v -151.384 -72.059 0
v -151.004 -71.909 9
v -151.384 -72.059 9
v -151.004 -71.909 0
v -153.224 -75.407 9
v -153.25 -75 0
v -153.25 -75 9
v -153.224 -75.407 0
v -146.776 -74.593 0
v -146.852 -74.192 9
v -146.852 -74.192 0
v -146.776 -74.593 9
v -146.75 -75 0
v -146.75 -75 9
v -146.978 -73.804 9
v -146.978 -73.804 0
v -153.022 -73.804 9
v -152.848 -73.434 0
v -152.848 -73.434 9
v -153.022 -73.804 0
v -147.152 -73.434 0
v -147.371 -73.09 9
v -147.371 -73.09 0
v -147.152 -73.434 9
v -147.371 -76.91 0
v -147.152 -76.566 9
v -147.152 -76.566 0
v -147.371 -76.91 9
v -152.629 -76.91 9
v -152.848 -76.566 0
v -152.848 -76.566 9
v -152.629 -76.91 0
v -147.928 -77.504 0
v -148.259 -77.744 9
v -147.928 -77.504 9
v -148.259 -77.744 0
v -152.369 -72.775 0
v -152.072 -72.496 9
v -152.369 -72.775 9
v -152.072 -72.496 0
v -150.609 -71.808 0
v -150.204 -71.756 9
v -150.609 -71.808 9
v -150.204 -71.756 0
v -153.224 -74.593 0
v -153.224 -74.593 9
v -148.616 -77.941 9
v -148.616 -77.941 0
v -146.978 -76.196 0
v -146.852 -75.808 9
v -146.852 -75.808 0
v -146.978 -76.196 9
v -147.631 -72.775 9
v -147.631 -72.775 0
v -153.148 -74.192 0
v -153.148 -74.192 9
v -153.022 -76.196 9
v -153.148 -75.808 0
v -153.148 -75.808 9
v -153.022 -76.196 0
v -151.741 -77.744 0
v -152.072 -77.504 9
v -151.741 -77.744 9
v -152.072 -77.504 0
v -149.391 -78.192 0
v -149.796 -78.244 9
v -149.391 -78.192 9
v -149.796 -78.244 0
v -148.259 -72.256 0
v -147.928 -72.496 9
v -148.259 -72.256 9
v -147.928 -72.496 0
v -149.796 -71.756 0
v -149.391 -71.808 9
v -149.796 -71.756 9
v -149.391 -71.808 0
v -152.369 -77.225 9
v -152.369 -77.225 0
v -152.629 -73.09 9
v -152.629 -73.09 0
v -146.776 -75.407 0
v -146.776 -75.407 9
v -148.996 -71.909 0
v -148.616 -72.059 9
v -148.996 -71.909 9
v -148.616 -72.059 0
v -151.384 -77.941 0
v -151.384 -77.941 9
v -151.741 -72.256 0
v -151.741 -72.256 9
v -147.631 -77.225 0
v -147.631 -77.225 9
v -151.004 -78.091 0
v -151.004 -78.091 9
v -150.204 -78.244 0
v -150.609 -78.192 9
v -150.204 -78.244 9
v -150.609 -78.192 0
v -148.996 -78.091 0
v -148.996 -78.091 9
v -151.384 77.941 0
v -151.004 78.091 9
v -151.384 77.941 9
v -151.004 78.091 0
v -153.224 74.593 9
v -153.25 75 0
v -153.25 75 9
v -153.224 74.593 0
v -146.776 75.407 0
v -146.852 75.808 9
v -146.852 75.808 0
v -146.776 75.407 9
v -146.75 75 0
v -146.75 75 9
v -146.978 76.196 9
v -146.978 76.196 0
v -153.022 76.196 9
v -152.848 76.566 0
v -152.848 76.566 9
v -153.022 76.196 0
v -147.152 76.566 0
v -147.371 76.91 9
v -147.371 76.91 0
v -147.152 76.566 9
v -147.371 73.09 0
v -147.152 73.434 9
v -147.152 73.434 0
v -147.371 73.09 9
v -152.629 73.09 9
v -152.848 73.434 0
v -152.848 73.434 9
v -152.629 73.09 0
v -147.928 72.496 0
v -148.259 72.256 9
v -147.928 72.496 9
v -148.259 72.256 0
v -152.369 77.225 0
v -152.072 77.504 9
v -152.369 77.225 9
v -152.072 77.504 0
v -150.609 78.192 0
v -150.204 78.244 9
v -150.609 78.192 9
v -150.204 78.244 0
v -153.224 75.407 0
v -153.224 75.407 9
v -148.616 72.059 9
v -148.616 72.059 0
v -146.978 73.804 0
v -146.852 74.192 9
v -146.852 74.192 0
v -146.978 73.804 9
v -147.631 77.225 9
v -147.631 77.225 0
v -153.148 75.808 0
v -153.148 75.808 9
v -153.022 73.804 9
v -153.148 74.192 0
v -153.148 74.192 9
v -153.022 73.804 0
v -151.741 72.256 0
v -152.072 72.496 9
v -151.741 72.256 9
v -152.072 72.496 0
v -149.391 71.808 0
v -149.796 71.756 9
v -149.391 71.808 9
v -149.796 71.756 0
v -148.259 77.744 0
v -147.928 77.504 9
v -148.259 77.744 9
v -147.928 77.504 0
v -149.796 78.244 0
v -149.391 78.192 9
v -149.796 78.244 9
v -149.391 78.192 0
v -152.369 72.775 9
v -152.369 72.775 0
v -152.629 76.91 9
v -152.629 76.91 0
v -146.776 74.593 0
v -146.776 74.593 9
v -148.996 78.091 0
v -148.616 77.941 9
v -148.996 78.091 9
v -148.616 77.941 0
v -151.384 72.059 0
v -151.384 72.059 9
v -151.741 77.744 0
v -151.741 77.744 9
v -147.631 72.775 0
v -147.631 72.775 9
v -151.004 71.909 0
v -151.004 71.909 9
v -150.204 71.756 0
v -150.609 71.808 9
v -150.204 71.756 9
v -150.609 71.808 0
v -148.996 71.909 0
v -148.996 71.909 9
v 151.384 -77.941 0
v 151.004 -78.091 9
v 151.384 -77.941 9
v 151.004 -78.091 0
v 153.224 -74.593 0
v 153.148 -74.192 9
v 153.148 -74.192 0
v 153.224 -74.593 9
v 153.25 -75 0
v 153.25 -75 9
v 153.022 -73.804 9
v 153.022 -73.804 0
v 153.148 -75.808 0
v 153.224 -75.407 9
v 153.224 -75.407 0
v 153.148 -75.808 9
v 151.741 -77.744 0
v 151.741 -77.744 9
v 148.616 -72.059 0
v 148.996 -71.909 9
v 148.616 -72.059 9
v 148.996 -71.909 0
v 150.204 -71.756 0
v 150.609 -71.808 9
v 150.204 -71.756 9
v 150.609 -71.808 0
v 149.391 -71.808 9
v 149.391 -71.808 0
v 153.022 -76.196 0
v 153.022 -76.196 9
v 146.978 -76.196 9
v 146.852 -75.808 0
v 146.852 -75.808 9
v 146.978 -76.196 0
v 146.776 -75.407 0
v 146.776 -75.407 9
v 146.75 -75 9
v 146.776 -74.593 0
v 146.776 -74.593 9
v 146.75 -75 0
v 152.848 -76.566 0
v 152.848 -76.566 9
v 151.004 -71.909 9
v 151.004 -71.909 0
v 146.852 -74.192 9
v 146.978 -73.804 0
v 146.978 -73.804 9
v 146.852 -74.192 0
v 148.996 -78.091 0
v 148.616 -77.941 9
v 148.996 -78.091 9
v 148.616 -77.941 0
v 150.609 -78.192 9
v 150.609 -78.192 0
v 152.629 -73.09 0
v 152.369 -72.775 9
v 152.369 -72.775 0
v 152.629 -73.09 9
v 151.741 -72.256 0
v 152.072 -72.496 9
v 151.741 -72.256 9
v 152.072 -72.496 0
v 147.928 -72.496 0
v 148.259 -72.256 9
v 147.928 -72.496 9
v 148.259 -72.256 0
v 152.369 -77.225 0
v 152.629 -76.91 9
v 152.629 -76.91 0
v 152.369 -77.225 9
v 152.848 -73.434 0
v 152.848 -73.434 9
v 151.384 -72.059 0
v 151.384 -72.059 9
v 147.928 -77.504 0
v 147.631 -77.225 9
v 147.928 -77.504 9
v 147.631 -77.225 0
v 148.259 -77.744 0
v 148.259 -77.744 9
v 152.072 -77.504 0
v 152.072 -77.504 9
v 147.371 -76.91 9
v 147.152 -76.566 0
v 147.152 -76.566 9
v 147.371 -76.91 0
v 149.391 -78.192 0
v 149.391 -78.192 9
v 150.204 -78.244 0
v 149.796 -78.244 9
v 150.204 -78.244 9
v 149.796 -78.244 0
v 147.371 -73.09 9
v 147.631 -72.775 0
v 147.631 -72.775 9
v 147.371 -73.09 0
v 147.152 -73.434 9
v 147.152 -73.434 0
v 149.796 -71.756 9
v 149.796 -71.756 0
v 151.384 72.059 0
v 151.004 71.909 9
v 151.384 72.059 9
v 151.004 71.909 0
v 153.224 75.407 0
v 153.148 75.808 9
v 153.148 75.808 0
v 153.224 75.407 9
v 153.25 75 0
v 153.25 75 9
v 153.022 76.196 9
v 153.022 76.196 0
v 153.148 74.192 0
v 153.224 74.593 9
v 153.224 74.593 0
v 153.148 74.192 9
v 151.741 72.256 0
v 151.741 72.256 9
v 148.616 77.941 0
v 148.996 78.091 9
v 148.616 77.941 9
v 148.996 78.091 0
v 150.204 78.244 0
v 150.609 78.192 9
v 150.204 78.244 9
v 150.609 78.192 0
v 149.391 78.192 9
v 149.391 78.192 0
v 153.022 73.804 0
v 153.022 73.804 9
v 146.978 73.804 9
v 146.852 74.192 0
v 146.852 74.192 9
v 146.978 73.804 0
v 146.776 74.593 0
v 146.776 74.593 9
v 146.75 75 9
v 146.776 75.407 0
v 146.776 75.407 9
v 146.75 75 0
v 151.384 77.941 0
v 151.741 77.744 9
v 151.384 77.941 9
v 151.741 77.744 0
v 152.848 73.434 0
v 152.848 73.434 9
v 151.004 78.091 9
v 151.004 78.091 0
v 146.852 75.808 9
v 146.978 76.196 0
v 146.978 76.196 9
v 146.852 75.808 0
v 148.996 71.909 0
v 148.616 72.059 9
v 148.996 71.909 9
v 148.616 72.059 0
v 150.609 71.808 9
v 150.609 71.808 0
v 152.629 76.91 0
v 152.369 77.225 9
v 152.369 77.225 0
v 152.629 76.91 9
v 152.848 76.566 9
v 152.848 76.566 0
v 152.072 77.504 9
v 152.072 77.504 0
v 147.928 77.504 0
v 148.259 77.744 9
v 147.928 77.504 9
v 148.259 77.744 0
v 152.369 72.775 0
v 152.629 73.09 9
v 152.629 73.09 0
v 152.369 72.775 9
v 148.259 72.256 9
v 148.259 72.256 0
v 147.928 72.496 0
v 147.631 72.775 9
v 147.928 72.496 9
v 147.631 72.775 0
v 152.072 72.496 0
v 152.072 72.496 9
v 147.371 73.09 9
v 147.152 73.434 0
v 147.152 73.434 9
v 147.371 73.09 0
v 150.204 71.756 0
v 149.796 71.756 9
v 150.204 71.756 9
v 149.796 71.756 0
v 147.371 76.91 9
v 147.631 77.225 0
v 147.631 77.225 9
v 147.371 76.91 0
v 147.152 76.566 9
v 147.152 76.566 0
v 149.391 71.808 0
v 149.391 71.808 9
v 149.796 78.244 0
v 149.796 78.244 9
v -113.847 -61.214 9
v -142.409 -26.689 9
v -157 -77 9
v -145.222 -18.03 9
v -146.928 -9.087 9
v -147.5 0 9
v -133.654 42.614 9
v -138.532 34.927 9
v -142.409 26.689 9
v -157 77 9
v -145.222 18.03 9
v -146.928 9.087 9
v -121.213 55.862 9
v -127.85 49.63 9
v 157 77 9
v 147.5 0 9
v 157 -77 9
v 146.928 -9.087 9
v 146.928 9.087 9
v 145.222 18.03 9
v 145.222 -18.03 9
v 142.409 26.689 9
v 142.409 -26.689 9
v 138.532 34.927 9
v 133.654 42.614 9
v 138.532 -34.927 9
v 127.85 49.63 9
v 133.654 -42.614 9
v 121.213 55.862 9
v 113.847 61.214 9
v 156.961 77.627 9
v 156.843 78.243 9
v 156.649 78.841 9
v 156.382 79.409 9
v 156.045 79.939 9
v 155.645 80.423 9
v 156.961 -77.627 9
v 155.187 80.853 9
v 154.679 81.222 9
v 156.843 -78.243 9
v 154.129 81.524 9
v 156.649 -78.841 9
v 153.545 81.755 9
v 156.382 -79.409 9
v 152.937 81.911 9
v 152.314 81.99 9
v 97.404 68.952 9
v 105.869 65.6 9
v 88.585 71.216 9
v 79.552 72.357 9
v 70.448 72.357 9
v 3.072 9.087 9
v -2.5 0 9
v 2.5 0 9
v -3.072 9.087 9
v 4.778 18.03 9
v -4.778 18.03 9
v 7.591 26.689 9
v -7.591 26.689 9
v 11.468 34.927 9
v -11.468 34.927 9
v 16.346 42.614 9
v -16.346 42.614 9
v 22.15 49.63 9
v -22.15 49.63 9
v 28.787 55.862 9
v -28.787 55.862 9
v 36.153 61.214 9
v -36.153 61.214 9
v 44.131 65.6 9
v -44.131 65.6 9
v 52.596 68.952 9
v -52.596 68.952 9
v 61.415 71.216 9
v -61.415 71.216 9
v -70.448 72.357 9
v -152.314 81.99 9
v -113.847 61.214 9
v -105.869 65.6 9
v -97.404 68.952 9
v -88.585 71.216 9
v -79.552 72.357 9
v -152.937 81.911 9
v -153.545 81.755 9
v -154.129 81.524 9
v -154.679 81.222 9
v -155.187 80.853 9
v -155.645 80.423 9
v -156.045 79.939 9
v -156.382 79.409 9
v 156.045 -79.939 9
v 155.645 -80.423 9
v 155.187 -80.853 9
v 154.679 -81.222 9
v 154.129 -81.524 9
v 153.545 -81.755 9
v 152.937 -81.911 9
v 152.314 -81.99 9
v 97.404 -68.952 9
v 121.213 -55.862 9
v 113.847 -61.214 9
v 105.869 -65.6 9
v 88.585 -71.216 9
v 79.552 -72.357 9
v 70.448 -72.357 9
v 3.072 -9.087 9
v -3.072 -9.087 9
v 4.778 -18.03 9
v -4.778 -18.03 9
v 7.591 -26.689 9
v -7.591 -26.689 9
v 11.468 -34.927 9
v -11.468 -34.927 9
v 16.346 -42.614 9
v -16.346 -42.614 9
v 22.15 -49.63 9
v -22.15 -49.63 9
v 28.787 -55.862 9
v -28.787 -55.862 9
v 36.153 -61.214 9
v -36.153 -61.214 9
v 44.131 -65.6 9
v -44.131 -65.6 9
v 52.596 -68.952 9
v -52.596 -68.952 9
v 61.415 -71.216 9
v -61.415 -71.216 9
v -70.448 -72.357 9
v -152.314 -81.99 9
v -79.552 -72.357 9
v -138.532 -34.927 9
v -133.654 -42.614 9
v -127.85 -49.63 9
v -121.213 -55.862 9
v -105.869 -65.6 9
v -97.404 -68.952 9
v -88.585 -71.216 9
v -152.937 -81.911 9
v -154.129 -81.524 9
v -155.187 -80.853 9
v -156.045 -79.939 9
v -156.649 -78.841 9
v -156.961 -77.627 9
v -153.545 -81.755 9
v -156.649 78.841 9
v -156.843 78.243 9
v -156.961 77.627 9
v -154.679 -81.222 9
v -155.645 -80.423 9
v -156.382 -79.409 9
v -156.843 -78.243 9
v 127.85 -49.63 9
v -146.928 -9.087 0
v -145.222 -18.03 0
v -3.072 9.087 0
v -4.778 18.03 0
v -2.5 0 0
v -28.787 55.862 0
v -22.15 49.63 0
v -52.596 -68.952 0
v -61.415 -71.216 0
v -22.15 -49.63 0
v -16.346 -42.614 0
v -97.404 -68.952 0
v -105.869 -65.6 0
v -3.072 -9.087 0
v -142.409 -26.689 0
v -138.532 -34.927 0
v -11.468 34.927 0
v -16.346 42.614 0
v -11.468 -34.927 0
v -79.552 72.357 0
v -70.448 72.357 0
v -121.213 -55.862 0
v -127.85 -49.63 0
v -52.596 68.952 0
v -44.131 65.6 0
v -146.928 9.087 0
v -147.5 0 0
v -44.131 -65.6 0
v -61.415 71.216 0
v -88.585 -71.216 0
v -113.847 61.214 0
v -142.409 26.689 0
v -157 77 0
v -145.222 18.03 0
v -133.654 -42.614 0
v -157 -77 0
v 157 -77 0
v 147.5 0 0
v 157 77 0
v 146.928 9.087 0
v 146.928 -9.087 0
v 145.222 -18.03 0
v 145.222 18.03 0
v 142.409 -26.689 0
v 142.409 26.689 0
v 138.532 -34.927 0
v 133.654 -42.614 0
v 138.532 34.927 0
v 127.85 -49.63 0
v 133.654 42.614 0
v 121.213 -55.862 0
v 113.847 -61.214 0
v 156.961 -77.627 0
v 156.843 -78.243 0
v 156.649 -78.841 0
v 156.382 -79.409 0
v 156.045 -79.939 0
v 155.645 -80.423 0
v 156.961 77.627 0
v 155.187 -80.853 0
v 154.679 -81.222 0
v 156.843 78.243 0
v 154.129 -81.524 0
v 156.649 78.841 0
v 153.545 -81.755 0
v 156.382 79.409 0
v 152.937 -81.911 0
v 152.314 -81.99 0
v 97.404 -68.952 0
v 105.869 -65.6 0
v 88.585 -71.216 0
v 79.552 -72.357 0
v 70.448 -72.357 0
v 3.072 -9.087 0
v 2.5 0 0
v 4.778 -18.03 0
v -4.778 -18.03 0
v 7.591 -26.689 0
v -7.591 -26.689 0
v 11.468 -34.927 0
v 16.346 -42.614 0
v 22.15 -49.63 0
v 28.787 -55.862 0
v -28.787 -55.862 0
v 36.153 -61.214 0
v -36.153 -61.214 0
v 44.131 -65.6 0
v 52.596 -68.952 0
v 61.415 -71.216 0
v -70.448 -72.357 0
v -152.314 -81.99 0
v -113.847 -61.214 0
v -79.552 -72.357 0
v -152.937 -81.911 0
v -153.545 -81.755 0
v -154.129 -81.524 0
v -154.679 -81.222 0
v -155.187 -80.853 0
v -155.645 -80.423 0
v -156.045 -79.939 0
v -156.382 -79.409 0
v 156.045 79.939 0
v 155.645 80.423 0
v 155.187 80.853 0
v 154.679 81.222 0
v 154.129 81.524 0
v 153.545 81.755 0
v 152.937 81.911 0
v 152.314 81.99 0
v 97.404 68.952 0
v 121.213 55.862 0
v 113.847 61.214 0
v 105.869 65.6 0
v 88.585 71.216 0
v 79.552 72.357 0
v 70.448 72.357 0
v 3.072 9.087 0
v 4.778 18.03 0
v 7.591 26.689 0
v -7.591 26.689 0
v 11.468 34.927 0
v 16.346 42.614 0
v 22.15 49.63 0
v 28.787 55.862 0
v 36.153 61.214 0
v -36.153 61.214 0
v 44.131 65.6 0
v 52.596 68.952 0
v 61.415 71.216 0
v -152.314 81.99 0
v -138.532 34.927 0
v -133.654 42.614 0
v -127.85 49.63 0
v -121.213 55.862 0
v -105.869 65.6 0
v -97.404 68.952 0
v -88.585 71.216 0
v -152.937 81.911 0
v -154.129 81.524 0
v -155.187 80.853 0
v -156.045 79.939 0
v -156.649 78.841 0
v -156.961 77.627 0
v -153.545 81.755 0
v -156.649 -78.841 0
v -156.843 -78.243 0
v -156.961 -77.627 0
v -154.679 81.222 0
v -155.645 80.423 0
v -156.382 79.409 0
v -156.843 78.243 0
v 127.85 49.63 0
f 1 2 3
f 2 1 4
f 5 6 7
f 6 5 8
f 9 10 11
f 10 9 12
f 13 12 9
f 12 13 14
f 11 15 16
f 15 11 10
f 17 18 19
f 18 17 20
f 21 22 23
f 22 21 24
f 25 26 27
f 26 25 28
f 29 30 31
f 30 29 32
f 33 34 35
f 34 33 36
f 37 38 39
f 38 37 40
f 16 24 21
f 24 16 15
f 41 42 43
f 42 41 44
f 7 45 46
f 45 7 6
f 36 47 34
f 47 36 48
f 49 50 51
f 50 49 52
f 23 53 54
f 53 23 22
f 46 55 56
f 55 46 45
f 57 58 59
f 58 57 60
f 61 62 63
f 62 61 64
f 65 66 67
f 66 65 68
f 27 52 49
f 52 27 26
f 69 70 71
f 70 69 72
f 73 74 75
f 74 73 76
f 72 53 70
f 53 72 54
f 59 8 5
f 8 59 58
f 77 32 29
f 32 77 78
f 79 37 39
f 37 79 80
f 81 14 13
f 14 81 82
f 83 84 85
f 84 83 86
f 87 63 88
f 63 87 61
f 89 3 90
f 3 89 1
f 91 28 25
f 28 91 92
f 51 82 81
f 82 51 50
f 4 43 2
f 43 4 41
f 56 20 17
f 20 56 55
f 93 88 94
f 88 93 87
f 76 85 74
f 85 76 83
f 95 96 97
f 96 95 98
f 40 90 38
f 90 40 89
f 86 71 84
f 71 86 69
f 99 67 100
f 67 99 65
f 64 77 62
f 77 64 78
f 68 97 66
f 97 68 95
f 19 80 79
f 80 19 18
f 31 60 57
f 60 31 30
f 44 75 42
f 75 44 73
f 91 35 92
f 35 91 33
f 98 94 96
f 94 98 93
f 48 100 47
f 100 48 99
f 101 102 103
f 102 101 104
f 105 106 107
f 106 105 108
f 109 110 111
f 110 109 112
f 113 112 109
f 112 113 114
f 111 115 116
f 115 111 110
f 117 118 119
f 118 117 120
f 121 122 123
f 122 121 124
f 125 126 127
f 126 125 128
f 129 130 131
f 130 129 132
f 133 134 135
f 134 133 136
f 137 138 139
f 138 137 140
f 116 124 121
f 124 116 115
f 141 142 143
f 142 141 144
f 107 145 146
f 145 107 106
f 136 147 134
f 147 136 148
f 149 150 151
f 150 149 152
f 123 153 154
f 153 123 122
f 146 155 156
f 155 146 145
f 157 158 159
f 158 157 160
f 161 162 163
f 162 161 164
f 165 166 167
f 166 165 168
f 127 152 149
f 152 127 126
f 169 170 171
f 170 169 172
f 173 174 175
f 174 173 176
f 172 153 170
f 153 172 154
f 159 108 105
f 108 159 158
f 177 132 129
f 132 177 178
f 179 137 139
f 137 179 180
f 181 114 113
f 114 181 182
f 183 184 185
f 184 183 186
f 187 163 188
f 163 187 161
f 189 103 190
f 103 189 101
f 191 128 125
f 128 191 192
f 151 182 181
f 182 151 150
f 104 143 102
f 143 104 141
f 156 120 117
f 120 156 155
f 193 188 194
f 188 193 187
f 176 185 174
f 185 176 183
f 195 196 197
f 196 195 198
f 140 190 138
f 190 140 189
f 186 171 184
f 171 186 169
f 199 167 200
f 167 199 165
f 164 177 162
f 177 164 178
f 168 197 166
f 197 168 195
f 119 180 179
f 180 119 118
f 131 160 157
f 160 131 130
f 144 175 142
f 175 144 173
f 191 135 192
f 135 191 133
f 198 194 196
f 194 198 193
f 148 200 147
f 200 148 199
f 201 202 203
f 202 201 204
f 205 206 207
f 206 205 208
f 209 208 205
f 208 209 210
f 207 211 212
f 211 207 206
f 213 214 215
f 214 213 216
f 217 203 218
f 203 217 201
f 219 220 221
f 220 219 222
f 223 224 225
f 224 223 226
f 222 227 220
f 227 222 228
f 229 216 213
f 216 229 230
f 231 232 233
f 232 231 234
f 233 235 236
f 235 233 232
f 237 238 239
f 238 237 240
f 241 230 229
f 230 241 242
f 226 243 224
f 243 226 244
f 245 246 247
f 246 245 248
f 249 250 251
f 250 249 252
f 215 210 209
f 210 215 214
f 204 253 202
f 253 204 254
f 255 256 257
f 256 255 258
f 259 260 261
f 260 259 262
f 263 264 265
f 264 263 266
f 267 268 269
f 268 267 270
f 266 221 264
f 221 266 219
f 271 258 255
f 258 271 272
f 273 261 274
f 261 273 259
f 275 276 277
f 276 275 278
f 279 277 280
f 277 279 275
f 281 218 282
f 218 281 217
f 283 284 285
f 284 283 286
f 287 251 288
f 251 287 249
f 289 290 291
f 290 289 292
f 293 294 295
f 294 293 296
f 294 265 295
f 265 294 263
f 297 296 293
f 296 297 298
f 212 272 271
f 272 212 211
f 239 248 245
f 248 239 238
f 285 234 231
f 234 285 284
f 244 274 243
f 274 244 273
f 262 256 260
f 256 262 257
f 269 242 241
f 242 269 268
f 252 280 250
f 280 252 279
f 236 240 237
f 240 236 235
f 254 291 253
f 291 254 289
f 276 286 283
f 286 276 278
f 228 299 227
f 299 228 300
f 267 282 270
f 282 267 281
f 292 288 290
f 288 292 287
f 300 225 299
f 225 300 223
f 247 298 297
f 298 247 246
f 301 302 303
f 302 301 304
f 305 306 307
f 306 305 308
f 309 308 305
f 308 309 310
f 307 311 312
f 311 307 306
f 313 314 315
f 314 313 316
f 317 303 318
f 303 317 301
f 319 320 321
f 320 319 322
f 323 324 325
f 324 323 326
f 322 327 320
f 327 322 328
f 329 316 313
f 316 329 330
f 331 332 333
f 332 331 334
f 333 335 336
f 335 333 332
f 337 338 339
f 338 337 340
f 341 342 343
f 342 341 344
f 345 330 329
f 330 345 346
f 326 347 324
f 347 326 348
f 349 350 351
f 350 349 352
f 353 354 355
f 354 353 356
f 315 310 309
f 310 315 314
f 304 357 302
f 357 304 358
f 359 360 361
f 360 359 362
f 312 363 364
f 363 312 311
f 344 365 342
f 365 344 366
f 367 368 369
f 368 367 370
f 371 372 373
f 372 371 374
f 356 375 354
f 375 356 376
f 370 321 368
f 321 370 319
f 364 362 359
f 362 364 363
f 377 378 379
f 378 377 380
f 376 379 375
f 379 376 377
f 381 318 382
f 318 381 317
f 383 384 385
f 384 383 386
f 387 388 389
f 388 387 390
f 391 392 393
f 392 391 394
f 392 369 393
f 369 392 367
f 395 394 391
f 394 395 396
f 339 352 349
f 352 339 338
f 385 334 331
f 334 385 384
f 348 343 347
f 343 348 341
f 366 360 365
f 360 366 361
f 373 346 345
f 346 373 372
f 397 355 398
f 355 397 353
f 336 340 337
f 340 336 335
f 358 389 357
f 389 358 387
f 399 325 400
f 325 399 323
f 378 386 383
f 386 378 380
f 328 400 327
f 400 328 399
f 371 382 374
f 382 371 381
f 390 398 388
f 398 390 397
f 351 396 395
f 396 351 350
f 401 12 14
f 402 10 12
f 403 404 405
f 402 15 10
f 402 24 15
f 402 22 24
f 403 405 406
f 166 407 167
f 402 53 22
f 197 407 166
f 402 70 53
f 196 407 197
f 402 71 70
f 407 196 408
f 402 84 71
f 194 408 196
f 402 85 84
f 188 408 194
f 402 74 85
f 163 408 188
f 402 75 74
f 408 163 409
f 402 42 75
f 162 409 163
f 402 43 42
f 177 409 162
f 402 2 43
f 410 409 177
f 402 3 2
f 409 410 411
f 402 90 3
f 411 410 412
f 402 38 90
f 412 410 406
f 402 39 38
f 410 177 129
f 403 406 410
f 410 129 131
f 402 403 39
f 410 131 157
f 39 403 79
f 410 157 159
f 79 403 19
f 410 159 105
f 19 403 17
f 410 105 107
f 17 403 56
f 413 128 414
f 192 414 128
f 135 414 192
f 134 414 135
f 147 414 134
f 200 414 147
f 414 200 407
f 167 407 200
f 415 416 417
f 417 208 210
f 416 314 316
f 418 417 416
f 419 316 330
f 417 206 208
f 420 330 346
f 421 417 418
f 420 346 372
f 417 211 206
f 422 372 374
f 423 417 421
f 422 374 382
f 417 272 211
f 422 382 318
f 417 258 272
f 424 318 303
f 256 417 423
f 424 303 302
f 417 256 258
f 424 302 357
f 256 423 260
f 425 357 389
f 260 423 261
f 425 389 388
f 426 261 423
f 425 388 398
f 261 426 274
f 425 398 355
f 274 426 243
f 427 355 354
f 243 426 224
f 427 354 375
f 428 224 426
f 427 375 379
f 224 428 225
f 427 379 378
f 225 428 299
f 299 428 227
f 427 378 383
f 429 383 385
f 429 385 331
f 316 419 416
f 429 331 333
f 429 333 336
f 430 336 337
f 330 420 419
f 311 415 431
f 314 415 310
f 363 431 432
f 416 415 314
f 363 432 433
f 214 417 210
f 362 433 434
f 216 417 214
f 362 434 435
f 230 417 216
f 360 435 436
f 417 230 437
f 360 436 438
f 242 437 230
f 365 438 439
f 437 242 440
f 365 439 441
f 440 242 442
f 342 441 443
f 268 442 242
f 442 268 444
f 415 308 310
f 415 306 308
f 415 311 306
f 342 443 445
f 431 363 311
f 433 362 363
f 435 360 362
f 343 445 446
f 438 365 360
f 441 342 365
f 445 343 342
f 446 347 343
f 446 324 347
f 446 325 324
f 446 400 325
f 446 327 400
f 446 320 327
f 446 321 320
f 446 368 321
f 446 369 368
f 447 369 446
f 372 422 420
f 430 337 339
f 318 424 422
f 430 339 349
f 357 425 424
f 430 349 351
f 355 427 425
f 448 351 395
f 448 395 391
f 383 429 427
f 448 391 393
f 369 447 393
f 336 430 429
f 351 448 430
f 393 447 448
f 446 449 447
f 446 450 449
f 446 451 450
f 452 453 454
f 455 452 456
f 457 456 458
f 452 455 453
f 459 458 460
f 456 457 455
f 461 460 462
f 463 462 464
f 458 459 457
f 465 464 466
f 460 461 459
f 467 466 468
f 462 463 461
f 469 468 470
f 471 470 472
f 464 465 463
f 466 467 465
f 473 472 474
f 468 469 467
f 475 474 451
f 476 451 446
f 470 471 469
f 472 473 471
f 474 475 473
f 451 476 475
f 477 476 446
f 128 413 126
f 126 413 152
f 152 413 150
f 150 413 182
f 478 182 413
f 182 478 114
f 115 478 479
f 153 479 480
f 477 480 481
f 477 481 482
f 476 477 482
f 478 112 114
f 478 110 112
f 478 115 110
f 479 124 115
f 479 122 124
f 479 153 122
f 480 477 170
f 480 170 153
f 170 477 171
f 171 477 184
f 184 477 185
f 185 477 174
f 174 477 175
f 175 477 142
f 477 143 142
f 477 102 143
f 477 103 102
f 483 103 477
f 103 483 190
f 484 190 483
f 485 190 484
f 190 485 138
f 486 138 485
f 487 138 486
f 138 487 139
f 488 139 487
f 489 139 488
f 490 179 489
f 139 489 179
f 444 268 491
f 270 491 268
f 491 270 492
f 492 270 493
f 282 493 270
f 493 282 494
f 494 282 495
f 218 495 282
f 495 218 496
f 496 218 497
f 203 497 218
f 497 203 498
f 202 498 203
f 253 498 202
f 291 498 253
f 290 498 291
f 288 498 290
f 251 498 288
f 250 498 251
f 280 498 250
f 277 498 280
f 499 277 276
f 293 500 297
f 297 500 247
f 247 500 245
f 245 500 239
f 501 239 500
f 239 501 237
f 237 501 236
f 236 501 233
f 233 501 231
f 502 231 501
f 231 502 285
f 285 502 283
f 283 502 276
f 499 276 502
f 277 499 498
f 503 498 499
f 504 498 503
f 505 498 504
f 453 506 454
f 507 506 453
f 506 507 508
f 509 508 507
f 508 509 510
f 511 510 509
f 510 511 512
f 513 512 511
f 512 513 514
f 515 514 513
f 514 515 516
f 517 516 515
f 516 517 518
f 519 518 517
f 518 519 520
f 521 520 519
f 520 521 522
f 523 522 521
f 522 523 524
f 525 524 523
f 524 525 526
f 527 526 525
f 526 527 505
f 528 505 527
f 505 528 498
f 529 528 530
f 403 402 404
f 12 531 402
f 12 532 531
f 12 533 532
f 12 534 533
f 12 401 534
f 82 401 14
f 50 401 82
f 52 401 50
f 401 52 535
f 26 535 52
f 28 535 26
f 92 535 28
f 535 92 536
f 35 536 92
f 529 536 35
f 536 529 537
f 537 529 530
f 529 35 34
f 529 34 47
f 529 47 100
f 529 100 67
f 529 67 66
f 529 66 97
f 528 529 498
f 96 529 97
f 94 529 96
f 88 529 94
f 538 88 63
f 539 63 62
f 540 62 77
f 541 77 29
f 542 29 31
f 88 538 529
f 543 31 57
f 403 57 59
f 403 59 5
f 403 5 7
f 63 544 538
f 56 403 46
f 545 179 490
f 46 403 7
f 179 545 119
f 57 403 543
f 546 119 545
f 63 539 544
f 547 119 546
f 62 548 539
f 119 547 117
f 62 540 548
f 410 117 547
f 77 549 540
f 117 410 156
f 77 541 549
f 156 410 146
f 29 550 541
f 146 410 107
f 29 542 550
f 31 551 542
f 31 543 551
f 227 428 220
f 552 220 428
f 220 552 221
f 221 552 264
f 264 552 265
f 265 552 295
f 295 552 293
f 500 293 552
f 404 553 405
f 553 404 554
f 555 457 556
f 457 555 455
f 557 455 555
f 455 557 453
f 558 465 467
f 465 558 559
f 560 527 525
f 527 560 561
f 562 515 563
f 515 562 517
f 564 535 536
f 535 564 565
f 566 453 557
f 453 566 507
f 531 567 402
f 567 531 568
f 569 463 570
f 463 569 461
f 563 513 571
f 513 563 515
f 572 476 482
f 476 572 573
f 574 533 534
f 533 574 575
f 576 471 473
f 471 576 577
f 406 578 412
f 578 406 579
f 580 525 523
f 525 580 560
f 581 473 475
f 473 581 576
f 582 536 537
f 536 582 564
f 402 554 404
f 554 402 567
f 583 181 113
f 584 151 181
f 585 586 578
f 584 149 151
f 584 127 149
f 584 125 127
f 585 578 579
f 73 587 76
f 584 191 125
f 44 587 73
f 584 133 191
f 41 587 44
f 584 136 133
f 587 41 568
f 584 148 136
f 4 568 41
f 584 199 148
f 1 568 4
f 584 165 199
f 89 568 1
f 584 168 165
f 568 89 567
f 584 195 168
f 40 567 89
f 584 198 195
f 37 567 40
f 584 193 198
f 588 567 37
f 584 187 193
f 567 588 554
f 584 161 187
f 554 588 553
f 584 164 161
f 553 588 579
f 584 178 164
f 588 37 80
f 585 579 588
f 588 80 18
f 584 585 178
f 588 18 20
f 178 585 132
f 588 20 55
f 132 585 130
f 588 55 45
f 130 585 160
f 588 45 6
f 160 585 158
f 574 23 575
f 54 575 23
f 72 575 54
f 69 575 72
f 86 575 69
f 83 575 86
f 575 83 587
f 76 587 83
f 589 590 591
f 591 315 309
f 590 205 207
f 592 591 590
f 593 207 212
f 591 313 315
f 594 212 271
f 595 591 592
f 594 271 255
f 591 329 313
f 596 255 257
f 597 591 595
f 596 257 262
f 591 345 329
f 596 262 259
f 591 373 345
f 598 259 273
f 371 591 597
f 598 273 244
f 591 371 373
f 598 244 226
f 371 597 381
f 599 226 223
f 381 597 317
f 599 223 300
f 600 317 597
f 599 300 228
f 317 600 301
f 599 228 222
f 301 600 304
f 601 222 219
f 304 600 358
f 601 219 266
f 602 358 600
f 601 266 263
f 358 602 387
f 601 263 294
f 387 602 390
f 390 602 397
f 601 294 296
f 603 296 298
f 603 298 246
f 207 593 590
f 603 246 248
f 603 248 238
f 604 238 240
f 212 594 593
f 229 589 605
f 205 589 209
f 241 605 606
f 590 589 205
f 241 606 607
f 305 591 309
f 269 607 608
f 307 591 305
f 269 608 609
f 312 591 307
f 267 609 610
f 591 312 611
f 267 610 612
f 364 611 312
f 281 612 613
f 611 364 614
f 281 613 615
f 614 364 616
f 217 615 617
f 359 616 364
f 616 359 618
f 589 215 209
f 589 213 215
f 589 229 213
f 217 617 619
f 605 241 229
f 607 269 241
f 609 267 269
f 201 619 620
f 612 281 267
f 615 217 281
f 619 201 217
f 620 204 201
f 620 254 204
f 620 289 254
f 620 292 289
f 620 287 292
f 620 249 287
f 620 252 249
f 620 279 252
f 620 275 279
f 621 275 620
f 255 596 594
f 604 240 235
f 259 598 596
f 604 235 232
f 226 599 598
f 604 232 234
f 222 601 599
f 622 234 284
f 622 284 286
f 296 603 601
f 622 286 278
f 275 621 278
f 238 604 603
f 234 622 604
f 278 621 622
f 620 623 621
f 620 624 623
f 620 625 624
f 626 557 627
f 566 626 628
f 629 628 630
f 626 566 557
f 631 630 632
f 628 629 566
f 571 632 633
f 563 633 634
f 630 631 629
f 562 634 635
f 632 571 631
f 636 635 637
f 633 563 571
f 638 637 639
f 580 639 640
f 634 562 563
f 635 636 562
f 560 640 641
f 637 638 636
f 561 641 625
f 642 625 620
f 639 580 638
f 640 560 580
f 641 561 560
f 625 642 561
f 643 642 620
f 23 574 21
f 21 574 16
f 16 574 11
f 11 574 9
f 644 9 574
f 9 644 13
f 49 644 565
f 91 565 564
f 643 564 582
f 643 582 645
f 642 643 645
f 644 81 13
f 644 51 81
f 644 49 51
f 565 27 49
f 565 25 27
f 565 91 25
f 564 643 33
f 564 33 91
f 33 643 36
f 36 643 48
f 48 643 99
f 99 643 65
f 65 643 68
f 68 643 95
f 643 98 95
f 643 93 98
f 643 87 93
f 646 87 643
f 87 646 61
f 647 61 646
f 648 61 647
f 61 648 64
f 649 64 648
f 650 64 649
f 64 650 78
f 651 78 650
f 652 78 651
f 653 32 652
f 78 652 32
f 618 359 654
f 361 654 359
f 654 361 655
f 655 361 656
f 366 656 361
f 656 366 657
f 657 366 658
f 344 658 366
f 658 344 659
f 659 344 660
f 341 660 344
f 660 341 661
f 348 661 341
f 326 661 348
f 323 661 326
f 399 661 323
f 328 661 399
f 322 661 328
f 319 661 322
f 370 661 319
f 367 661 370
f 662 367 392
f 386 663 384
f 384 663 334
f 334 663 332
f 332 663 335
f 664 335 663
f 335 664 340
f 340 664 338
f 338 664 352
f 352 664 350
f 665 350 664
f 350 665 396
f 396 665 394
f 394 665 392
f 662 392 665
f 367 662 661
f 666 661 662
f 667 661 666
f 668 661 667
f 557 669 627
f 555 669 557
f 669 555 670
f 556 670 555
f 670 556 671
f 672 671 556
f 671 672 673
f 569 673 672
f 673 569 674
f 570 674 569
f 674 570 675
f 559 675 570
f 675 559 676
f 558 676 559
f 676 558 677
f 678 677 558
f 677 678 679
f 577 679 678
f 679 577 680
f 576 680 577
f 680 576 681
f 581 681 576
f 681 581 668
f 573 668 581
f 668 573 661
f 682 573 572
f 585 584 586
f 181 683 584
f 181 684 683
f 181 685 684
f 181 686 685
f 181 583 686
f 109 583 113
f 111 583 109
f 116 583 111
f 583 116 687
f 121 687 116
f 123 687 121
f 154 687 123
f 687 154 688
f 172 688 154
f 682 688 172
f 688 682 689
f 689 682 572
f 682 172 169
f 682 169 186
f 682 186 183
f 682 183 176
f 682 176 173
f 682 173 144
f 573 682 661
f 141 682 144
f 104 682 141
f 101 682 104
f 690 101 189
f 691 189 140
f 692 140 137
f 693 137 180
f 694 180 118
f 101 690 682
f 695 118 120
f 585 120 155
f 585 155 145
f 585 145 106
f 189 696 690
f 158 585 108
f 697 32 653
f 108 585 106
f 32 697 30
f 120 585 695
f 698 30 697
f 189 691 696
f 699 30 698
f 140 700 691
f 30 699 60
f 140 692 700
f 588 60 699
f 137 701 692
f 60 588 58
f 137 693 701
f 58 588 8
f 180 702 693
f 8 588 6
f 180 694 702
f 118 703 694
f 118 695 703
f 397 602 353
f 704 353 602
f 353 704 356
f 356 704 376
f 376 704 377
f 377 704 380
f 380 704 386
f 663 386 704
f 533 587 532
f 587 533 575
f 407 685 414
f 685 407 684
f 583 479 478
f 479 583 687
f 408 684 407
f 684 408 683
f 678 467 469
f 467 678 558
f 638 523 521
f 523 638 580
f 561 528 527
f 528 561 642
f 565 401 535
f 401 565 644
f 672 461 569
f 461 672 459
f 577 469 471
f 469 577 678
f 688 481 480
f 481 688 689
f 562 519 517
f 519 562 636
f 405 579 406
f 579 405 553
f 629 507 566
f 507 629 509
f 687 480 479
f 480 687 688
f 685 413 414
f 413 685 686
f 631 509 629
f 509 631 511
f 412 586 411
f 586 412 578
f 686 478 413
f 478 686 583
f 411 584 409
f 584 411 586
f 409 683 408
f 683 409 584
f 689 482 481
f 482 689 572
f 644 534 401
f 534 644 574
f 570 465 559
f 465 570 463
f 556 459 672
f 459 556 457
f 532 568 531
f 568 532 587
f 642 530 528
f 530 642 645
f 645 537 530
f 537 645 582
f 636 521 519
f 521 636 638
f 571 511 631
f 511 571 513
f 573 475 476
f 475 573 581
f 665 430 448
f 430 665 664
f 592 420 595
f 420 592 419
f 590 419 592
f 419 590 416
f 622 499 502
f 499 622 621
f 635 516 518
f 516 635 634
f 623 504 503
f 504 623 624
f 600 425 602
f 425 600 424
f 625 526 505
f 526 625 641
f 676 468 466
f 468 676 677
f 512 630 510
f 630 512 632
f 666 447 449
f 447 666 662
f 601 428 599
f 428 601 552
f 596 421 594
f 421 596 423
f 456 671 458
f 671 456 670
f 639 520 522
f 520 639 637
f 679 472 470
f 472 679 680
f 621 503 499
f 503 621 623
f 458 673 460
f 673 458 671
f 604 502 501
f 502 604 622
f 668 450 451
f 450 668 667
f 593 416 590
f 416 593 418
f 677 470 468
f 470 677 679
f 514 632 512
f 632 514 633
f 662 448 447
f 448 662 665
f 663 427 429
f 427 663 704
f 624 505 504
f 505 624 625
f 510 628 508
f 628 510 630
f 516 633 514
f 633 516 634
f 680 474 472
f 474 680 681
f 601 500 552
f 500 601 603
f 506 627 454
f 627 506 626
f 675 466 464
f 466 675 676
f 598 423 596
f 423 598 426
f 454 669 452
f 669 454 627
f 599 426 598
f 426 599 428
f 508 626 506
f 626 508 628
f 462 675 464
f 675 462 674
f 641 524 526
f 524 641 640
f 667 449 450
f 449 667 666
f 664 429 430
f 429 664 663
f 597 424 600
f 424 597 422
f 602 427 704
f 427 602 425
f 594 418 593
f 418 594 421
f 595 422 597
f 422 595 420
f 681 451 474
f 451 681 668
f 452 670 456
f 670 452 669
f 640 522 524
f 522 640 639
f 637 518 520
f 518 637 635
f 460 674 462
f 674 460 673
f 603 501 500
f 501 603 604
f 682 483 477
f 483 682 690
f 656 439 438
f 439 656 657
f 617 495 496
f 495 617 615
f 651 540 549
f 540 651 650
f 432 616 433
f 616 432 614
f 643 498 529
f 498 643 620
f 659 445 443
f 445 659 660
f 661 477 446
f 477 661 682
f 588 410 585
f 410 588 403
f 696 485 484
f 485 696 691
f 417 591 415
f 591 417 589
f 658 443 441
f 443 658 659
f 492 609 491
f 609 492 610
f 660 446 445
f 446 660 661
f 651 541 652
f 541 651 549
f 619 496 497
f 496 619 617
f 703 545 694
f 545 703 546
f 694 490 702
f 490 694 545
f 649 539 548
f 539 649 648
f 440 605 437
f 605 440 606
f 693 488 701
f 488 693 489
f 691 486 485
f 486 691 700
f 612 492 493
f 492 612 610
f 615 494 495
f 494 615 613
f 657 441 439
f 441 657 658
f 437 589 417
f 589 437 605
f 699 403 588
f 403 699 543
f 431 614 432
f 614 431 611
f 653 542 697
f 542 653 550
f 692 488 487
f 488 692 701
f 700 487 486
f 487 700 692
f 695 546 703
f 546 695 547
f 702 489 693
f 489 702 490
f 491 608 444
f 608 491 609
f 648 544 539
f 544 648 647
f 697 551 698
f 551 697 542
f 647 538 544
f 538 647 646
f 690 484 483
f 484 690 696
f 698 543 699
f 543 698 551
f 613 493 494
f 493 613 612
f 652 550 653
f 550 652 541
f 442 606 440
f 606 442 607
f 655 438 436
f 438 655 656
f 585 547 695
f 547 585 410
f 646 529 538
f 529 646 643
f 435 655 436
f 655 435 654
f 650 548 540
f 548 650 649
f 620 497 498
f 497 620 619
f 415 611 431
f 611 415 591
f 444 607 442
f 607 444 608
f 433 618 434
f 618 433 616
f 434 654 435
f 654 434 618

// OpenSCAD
$fn = 50;


difference() {
	union() {
		hull() {
			translate(v = [-152.0000000000, 77.0000000000, 0]) {
				cylinder(h = 9, r = 5);
			}
			translate(v = [152.0000000000, 77.0000000000, 0]) {
				cylinder(h = 9, r = 5);
			}
			translate(v = [-152.0000000000, -77.0000000000, 0]) {
				cylinder(h = 9, r = 5);
			}
			translate(v = [152.0000000000, -77.0000000000, 0]) {
				cylinder(h = 9, r = 5);
			}
		}
	}
	union() {
		#translate(v = [-150.0000000000, -75.0000000000, -100.0000000000]) {
			cylinder(h = 200, r = 3.2500000000);
		}
		#translate(v = [-150.0000000000, 75.0000000000, -100.0000000000]) {
			cylinder(h = 200, r = 3.2500000000);
		}
		#translate(v = [150.0000000000, -75.0000000000, -100.0000000000]) {
			cylinder(h = 200, r = 3.2500000000);
		}
		#translate(v = [150.0000000000, 75.0000000000, -100.0000000000]) {
			cylinder(h = 200, r = 3.2500000000);
		}
		#translate(v = [-75.0000000000, 0, 0]) {
			cylinder(h = 9, r = 72.5000000000);
		}
		#translate(v = [75.0000000000, 0, 0]) {
			cylinder(h = 9, r = 72.5000000000);
		}
	}
}
